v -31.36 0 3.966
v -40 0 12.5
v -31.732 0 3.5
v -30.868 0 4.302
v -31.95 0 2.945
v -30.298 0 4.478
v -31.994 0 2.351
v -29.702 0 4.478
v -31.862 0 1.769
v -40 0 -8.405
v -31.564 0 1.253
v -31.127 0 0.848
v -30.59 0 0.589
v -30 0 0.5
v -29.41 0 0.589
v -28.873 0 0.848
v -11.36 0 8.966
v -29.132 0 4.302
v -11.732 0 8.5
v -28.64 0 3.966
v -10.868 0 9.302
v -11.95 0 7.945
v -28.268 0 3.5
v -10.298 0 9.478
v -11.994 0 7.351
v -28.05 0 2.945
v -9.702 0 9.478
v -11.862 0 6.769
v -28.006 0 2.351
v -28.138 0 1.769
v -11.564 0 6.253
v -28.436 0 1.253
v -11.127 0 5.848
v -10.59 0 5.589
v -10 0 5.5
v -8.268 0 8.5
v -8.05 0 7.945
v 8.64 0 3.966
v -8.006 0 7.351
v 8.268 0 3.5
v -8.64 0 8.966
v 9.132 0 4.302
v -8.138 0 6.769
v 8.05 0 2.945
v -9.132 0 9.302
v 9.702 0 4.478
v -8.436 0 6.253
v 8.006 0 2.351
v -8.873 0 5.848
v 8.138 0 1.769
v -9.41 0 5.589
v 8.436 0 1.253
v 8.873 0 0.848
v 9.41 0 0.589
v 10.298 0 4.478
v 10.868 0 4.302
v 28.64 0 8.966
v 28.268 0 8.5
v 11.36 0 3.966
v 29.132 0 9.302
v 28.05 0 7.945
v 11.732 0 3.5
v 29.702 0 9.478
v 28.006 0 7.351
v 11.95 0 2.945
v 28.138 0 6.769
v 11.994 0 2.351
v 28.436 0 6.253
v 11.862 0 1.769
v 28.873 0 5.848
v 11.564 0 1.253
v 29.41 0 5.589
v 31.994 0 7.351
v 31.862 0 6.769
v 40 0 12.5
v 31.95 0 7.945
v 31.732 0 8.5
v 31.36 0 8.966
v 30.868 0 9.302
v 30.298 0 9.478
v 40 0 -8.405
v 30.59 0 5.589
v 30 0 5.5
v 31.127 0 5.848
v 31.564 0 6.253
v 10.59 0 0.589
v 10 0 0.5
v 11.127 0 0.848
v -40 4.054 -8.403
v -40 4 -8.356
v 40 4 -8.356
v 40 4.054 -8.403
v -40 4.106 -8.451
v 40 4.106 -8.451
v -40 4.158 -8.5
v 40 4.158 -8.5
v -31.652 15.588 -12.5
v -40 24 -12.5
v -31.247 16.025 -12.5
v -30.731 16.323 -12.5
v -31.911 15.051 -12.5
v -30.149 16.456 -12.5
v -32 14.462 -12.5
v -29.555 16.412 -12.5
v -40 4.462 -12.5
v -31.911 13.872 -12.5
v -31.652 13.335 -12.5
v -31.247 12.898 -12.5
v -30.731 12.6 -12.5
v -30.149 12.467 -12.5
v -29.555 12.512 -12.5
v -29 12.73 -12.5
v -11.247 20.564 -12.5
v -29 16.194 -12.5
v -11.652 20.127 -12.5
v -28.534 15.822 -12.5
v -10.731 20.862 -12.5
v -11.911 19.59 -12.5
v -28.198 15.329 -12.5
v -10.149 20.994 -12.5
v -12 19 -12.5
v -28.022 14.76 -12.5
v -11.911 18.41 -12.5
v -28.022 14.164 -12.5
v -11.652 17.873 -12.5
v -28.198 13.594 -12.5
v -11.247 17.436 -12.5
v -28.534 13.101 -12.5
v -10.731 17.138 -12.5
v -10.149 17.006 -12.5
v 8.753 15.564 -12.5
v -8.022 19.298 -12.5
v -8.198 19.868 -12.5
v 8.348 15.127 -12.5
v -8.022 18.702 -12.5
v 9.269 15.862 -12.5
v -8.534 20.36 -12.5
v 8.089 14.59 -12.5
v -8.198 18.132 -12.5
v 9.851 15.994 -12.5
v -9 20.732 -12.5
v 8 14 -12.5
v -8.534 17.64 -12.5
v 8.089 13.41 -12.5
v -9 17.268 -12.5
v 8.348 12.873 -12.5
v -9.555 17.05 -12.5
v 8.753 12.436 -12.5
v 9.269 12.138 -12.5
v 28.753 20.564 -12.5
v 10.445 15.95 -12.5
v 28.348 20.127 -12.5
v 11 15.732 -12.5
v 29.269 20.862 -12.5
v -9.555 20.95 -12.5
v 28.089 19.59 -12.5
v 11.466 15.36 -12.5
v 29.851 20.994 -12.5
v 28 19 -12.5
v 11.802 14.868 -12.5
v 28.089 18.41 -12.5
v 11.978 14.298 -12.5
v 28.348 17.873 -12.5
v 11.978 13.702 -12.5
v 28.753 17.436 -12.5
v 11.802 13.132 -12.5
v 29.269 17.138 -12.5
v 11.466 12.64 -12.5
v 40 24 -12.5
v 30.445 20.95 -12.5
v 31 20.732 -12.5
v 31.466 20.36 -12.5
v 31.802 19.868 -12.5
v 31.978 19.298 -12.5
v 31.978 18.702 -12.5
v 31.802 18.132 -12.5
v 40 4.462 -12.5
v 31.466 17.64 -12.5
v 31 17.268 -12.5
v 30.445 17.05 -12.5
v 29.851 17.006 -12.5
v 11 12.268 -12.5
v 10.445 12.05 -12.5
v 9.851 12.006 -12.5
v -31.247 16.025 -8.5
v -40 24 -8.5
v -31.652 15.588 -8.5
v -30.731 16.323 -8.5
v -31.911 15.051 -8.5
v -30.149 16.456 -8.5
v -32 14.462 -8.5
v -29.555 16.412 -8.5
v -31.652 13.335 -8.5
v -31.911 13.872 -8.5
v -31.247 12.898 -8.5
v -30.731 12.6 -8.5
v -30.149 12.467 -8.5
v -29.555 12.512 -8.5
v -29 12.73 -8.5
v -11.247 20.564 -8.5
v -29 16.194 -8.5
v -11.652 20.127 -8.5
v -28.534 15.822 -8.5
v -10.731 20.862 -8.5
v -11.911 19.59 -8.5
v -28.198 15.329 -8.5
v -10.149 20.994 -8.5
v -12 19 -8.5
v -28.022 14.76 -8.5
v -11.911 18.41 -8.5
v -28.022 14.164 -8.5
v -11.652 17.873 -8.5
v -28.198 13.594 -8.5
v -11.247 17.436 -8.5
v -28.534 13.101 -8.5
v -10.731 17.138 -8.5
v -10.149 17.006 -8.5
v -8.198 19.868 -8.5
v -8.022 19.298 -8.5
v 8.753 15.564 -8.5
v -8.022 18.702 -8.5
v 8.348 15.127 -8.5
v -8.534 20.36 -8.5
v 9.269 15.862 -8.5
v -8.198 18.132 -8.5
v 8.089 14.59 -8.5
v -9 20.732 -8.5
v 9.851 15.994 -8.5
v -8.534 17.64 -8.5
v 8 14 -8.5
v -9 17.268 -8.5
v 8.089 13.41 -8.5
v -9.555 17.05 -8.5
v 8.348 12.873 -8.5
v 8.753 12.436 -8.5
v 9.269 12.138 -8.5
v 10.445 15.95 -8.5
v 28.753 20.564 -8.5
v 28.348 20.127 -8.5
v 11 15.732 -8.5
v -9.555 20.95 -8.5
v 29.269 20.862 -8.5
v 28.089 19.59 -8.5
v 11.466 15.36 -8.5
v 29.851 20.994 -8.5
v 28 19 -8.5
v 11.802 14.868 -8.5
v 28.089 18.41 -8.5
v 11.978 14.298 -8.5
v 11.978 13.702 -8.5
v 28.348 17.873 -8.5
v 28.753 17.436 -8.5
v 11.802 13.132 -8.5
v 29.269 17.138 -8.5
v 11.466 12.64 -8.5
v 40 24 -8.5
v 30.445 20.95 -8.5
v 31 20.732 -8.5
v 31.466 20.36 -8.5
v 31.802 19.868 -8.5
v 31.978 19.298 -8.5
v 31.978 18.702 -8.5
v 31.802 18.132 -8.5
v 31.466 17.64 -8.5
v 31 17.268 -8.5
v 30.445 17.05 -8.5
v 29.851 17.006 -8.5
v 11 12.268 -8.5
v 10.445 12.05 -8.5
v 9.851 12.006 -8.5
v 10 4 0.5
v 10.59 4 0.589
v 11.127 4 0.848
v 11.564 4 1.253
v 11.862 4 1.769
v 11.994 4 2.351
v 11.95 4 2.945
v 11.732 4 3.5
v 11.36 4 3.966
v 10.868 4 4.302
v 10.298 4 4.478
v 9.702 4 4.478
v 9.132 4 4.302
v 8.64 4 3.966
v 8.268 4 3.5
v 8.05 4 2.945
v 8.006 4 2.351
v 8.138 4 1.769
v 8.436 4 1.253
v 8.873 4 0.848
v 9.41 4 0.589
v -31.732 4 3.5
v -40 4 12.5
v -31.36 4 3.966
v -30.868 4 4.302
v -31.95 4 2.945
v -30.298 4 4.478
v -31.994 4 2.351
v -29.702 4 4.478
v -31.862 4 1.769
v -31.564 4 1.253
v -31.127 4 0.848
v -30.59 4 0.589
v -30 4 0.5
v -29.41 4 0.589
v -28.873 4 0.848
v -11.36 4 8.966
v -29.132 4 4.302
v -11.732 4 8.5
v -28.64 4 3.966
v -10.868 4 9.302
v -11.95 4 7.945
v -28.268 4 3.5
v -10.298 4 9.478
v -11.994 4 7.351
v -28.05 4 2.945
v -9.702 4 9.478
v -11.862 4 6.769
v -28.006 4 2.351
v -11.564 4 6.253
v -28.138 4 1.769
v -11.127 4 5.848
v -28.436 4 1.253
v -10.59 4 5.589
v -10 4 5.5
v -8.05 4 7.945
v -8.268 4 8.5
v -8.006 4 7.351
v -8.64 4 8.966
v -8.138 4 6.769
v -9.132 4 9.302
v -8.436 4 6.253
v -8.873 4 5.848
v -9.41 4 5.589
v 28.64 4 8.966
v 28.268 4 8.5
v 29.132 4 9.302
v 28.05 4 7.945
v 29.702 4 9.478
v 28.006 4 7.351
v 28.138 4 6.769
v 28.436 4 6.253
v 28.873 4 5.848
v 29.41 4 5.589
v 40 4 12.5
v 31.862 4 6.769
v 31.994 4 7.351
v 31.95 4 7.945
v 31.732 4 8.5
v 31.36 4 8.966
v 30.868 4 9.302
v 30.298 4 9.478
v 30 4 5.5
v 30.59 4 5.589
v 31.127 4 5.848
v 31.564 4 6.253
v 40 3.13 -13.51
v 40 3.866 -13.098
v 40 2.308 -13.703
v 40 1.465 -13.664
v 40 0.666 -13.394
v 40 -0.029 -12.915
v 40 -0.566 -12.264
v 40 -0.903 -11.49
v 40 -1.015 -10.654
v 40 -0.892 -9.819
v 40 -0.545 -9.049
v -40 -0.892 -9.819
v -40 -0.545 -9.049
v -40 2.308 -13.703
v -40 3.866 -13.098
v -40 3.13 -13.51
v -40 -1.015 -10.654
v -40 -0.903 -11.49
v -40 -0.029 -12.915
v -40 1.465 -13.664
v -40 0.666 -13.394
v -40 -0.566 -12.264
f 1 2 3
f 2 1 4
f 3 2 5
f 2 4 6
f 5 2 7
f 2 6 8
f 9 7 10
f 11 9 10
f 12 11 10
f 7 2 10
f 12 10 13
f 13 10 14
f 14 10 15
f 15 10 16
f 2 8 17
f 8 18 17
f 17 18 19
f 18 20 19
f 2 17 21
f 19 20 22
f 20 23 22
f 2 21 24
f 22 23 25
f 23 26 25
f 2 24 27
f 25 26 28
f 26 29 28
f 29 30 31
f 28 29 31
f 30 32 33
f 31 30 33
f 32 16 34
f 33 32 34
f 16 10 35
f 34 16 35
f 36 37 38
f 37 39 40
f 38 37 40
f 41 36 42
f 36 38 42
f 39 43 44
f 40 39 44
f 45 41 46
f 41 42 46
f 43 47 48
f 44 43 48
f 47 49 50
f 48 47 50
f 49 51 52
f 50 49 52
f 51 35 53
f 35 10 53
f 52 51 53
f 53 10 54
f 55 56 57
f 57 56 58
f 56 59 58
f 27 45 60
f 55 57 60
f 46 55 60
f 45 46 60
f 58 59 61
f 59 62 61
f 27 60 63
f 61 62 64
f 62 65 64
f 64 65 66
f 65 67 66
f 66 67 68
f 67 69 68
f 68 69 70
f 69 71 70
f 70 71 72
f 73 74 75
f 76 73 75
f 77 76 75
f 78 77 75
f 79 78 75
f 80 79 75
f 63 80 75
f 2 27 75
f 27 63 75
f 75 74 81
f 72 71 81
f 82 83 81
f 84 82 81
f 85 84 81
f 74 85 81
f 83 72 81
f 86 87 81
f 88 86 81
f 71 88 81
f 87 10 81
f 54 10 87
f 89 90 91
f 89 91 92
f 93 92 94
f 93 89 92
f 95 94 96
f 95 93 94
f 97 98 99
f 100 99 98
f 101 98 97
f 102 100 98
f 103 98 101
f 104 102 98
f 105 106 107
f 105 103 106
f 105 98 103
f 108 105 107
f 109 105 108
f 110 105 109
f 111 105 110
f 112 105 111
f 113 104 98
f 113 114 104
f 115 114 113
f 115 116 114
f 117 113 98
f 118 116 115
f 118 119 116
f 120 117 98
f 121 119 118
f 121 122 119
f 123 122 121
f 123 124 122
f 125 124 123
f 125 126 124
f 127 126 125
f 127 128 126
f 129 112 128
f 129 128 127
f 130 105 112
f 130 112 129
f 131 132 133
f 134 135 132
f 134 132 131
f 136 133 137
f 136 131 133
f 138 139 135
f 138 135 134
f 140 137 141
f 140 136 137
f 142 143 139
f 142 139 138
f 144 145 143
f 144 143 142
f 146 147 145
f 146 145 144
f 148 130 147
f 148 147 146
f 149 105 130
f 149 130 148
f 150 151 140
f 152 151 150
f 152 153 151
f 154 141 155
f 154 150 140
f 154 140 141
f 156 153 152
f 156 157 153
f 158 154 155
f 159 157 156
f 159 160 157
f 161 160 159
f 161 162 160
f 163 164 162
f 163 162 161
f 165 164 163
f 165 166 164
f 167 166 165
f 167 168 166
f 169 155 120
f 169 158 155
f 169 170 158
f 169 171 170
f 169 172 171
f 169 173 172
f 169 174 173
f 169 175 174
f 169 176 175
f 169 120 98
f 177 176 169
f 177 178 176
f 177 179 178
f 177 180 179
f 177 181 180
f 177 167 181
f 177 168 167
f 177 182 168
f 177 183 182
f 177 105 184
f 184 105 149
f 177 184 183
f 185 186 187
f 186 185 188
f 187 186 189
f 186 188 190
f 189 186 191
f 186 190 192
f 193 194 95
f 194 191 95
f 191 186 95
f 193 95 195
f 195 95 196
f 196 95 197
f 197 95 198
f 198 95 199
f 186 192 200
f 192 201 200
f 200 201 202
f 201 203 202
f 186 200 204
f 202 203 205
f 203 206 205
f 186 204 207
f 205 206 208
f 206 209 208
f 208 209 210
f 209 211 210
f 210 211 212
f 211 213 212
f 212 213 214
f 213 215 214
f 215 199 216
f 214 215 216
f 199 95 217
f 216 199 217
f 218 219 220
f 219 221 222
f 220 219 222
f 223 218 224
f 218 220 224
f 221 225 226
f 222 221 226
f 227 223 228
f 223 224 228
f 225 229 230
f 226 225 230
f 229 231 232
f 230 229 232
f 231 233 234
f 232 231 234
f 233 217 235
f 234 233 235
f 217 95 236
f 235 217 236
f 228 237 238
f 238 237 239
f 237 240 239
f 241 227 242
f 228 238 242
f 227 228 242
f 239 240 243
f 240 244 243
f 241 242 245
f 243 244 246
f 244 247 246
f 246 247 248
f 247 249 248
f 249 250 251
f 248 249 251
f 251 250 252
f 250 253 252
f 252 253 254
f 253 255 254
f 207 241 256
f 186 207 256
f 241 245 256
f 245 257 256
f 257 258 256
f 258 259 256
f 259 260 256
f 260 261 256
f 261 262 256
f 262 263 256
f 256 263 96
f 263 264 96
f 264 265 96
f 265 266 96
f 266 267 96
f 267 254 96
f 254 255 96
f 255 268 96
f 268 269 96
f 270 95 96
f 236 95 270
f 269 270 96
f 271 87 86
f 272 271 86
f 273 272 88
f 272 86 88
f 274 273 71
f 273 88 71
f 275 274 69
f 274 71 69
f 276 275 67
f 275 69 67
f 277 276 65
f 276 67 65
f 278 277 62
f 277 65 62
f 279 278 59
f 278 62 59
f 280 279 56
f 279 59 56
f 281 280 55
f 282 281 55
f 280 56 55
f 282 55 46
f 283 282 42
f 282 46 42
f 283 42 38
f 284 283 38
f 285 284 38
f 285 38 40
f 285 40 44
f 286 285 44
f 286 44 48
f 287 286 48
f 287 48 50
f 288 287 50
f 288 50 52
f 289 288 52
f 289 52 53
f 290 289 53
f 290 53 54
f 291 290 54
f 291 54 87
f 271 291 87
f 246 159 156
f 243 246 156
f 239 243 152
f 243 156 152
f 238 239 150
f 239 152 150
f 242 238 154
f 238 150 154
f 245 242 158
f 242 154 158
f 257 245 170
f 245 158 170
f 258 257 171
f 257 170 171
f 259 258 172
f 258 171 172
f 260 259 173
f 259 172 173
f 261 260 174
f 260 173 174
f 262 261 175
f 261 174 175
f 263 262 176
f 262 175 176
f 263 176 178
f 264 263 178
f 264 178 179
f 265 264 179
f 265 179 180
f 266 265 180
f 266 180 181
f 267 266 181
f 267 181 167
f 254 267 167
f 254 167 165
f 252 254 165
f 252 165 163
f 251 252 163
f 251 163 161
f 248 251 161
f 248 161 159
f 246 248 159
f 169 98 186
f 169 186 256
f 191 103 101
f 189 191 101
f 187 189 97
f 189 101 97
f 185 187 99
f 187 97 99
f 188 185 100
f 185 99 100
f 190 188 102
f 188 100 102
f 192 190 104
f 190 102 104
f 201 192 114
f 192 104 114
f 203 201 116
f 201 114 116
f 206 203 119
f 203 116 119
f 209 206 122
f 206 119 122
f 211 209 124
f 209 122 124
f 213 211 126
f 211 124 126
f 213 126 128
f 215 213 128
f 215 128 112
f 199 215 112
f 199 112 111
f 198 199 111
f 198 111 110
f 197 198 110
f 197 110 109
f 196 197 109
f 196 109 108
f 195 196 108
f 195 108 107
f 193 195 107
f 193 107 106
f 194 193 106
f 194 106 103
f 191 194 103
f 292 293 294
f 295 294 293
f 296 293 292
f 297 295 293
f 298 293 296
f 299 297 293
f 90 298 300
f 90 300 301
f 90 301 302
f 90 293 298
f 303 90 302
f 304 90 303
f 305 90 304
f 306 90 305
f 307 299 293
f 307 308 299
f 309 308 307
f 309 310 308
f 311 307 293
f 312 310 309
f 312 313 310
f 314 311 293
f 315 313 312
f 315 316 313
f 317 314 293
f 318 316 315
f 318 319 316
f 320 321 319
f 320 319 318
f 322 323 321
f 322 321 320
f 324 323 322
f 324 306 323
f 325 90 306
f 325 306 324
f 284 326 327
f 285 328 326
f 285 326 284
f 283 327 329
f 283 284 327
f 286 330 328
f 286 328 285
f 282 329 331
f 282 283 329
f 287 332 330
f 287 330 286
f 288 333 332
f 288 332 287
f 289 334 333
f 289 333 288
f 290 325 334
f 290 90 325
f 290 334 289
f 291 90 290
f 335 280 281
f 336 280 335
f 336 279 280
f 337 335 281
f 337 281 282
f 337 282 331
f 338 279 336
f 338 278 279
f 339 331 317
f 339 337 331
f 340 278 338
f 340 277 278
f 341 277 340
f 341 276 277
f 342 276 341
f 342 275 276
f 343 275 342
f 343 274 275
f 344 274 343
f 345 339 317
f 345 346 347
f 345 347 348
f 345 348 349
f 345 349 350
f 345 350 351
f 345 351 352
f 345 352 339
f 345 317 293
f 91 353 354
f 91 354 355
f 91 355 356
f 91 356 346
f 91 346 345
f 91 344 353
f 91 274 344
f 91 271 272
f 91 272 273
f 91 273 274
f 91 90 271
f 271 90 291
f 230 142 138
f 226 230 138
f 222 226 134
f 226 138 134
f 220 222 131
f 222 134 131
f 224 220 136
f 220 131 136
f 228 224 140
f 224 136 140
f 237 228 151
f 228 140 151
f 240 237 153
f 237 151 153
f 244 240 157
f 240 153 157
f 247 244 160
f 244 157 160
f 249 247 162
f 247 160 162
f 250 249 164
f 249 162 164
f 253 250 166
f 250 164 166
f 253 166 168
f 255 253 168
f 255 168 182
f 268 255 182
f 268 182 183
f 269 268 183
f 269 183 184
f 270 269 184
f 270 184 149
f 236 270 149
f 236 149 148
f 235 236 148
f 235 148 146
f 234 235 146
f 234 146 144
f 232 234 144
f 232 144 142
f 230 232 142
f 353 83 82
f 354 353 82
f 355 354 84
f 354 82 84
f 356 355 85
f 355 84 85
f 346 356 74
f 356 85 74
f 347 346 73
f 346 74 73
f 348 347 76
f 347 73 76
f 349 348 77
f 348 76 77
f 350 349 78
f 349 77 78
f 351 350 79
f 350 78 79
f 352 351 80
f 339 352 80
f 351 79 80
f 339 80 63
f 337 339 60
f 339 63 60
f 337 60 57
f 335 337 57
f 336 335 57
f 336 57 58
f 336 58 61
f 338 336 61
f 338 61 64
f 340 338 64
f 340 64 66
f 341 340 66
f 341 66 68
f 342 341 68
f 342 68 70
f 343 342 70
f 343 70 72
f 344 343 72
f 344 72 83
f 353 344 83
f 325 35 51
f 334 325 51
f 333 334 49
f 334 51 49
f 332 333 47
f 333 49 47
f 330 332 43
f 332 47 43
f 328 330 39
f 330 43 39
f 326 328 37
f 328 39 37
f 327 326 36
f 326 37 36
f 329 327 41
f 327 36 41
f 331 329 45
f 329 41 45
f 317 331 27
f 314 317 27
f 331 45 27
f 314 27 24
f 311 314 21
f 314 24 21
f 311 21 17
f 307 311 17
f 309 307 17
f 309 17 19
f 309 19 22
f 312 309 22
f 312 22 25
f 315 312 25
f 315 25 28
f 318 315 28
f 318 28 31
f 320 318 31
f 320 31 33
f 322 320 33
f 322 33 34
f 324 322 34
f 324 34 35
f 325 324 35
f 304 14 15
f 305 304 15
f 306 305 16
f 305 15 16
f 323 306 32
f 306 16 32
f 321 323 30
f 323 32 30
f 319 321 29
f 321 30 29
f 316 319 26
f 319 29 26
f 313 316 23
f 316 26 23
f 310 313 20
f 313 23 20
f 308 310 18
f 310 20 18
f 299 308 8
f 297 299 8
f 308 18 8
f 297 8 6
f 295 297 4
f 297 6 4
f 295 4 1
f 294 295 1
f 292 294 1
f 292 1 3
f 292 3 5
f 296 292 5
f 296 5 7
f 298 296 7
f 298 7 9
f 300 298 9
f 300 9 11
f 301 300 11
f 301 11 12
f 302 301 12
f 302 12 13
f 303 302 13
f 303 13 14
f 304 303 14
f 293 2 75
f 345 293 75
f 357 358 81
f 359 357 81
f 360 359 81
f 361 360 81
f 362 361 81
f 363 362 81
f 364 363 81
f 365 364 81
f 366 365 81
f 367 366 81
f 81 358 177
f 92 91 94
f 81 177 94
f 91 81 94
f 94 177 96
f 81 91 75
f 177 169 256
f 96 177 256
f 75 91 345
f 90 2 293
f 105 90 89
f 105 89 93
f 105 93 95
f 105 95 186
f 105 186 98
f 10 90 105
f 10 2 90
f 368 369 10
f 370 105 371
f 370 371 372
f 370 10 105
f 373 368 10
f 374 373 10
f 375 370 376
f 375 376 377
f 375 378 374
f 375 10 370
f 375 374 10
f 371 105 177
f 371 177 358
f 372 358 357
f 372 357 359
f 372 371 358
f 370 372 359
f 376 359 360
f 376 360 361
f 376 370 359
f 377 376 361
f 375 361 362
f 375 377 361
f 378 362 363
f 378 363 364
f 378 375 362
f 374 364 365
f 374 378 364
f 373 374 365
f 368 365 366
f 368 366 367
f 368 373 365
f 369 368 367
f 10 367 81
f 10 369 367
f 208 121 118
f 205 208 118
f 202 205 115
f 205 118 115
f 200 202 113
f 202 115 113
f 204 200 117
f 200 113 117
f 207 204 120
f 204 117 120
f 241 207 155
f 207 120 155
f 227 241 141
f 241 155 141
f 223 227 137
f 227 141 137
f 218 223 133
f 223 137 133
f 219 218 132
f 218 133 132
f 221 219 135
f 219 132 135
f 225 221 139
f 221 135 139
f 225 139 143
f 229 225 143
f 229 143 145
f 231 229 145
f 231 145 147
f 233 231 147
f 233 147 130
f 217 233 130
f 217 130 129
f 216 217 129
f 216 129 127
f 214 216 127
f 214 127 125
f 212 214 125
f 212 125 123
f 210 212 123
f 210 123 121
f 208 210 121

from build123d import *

# Parameters (mm, degrees)
SKETCH1_W           = 80
SKETCH1_H           = 25
BOSS_EXTRUDE1_DEPTH = 4
SKETCH2_W           = 80
SKETCH2_H           = 4
BOSS_EXTRUDE2_DEPTH = 20
SKETCH3_R           = 3.042773103
BOSS_EXTRUDE3_DEPTH = 80
SKETCH4_R           = 2
CUT_EXTRUDE1_DEPTH  = 80
SKETCH5_R           = 2
CUT_EXTRUDE2_DEPTH  = 80


with BuildPart() as part:
    # Sketch1 → Boss-Extrude1 (new body)
    with BuildSketch(Plane(origin=(0, 0, 0), x_dir=(1, 0, 0), z_dir=(0, 1, 0))):
        Rectangle(SKETCH1_W, SKETCH1_H)
    extrude(amount=BOSS_EXTRUDE1_DEPTH)

    # Sketch2 → Boss-Extrude2 (add)
    with BuildSketch(Plane(origin=(0, 4, 0), x_dir=(1, 0, 0), z_dir=(0, 1, 0))):
        with Locations((0, 10.5)):
            Rectangle(SKETCH2_W, SKETCH2_H)
    extrude(amount=BOSS_EXTRUDE2_DEPTH)

    # Sketch3 → Boss-Extrude3 (add)
    with BuildSketch(Plane.ZY.offset(40)):
        with Locations((-10.673404756, 2.028198383)):
            Circle(SKETCH3_R)
    extrude(amount=-BOSS_EXTRUDE3_DEPTH)

    # Sketch4 → Cut-Extrude1 (cut)
    with BuildSketch(Plane(origin=(0, 0, -12.5), x_dir=(-1, 0, 0), z_dir=(0, 0, -1))):
        with Locations((30, 14.461718051)):
            Circle(SKETCH4_R)
        with Locations((-10, 14)):
            Circle(SKETCH4_R)
        with Locations((10, 19)):
            Circle(SKETCH4_R)
        with Locations((-30, 19)):
            Circle(SKETCH4_R)
    extrude(amount=-CUT_EXTRUDE1_DEPTH, mode=Mode.SUBTRACT)

    # Sketch5 → Cut-Extrude2 (cut)
    with BuildSketch(Plane.XZ):
        with Locations(Location((-30, 2.5, 0), (0, 0, 270))):
            Circle(SKETCH5_R)
        with Locations(Location((-10, 7.5, 0), (0, 0, 270))):
            Circle(SKETCH5_R)
        with Locations(Location((10, 2.5, 0), (0, 0, 270))):
            Circle(SKETCH5_R)
        with Locations(Location((30, 7.5, 0), (0, 0, 270))):
            Circle(SKETCH5_R)
    extrude(amount=-CUT_EXTRUDE2_DEPTH, mode=Mode.SUBTRACT)


solid = part.part
